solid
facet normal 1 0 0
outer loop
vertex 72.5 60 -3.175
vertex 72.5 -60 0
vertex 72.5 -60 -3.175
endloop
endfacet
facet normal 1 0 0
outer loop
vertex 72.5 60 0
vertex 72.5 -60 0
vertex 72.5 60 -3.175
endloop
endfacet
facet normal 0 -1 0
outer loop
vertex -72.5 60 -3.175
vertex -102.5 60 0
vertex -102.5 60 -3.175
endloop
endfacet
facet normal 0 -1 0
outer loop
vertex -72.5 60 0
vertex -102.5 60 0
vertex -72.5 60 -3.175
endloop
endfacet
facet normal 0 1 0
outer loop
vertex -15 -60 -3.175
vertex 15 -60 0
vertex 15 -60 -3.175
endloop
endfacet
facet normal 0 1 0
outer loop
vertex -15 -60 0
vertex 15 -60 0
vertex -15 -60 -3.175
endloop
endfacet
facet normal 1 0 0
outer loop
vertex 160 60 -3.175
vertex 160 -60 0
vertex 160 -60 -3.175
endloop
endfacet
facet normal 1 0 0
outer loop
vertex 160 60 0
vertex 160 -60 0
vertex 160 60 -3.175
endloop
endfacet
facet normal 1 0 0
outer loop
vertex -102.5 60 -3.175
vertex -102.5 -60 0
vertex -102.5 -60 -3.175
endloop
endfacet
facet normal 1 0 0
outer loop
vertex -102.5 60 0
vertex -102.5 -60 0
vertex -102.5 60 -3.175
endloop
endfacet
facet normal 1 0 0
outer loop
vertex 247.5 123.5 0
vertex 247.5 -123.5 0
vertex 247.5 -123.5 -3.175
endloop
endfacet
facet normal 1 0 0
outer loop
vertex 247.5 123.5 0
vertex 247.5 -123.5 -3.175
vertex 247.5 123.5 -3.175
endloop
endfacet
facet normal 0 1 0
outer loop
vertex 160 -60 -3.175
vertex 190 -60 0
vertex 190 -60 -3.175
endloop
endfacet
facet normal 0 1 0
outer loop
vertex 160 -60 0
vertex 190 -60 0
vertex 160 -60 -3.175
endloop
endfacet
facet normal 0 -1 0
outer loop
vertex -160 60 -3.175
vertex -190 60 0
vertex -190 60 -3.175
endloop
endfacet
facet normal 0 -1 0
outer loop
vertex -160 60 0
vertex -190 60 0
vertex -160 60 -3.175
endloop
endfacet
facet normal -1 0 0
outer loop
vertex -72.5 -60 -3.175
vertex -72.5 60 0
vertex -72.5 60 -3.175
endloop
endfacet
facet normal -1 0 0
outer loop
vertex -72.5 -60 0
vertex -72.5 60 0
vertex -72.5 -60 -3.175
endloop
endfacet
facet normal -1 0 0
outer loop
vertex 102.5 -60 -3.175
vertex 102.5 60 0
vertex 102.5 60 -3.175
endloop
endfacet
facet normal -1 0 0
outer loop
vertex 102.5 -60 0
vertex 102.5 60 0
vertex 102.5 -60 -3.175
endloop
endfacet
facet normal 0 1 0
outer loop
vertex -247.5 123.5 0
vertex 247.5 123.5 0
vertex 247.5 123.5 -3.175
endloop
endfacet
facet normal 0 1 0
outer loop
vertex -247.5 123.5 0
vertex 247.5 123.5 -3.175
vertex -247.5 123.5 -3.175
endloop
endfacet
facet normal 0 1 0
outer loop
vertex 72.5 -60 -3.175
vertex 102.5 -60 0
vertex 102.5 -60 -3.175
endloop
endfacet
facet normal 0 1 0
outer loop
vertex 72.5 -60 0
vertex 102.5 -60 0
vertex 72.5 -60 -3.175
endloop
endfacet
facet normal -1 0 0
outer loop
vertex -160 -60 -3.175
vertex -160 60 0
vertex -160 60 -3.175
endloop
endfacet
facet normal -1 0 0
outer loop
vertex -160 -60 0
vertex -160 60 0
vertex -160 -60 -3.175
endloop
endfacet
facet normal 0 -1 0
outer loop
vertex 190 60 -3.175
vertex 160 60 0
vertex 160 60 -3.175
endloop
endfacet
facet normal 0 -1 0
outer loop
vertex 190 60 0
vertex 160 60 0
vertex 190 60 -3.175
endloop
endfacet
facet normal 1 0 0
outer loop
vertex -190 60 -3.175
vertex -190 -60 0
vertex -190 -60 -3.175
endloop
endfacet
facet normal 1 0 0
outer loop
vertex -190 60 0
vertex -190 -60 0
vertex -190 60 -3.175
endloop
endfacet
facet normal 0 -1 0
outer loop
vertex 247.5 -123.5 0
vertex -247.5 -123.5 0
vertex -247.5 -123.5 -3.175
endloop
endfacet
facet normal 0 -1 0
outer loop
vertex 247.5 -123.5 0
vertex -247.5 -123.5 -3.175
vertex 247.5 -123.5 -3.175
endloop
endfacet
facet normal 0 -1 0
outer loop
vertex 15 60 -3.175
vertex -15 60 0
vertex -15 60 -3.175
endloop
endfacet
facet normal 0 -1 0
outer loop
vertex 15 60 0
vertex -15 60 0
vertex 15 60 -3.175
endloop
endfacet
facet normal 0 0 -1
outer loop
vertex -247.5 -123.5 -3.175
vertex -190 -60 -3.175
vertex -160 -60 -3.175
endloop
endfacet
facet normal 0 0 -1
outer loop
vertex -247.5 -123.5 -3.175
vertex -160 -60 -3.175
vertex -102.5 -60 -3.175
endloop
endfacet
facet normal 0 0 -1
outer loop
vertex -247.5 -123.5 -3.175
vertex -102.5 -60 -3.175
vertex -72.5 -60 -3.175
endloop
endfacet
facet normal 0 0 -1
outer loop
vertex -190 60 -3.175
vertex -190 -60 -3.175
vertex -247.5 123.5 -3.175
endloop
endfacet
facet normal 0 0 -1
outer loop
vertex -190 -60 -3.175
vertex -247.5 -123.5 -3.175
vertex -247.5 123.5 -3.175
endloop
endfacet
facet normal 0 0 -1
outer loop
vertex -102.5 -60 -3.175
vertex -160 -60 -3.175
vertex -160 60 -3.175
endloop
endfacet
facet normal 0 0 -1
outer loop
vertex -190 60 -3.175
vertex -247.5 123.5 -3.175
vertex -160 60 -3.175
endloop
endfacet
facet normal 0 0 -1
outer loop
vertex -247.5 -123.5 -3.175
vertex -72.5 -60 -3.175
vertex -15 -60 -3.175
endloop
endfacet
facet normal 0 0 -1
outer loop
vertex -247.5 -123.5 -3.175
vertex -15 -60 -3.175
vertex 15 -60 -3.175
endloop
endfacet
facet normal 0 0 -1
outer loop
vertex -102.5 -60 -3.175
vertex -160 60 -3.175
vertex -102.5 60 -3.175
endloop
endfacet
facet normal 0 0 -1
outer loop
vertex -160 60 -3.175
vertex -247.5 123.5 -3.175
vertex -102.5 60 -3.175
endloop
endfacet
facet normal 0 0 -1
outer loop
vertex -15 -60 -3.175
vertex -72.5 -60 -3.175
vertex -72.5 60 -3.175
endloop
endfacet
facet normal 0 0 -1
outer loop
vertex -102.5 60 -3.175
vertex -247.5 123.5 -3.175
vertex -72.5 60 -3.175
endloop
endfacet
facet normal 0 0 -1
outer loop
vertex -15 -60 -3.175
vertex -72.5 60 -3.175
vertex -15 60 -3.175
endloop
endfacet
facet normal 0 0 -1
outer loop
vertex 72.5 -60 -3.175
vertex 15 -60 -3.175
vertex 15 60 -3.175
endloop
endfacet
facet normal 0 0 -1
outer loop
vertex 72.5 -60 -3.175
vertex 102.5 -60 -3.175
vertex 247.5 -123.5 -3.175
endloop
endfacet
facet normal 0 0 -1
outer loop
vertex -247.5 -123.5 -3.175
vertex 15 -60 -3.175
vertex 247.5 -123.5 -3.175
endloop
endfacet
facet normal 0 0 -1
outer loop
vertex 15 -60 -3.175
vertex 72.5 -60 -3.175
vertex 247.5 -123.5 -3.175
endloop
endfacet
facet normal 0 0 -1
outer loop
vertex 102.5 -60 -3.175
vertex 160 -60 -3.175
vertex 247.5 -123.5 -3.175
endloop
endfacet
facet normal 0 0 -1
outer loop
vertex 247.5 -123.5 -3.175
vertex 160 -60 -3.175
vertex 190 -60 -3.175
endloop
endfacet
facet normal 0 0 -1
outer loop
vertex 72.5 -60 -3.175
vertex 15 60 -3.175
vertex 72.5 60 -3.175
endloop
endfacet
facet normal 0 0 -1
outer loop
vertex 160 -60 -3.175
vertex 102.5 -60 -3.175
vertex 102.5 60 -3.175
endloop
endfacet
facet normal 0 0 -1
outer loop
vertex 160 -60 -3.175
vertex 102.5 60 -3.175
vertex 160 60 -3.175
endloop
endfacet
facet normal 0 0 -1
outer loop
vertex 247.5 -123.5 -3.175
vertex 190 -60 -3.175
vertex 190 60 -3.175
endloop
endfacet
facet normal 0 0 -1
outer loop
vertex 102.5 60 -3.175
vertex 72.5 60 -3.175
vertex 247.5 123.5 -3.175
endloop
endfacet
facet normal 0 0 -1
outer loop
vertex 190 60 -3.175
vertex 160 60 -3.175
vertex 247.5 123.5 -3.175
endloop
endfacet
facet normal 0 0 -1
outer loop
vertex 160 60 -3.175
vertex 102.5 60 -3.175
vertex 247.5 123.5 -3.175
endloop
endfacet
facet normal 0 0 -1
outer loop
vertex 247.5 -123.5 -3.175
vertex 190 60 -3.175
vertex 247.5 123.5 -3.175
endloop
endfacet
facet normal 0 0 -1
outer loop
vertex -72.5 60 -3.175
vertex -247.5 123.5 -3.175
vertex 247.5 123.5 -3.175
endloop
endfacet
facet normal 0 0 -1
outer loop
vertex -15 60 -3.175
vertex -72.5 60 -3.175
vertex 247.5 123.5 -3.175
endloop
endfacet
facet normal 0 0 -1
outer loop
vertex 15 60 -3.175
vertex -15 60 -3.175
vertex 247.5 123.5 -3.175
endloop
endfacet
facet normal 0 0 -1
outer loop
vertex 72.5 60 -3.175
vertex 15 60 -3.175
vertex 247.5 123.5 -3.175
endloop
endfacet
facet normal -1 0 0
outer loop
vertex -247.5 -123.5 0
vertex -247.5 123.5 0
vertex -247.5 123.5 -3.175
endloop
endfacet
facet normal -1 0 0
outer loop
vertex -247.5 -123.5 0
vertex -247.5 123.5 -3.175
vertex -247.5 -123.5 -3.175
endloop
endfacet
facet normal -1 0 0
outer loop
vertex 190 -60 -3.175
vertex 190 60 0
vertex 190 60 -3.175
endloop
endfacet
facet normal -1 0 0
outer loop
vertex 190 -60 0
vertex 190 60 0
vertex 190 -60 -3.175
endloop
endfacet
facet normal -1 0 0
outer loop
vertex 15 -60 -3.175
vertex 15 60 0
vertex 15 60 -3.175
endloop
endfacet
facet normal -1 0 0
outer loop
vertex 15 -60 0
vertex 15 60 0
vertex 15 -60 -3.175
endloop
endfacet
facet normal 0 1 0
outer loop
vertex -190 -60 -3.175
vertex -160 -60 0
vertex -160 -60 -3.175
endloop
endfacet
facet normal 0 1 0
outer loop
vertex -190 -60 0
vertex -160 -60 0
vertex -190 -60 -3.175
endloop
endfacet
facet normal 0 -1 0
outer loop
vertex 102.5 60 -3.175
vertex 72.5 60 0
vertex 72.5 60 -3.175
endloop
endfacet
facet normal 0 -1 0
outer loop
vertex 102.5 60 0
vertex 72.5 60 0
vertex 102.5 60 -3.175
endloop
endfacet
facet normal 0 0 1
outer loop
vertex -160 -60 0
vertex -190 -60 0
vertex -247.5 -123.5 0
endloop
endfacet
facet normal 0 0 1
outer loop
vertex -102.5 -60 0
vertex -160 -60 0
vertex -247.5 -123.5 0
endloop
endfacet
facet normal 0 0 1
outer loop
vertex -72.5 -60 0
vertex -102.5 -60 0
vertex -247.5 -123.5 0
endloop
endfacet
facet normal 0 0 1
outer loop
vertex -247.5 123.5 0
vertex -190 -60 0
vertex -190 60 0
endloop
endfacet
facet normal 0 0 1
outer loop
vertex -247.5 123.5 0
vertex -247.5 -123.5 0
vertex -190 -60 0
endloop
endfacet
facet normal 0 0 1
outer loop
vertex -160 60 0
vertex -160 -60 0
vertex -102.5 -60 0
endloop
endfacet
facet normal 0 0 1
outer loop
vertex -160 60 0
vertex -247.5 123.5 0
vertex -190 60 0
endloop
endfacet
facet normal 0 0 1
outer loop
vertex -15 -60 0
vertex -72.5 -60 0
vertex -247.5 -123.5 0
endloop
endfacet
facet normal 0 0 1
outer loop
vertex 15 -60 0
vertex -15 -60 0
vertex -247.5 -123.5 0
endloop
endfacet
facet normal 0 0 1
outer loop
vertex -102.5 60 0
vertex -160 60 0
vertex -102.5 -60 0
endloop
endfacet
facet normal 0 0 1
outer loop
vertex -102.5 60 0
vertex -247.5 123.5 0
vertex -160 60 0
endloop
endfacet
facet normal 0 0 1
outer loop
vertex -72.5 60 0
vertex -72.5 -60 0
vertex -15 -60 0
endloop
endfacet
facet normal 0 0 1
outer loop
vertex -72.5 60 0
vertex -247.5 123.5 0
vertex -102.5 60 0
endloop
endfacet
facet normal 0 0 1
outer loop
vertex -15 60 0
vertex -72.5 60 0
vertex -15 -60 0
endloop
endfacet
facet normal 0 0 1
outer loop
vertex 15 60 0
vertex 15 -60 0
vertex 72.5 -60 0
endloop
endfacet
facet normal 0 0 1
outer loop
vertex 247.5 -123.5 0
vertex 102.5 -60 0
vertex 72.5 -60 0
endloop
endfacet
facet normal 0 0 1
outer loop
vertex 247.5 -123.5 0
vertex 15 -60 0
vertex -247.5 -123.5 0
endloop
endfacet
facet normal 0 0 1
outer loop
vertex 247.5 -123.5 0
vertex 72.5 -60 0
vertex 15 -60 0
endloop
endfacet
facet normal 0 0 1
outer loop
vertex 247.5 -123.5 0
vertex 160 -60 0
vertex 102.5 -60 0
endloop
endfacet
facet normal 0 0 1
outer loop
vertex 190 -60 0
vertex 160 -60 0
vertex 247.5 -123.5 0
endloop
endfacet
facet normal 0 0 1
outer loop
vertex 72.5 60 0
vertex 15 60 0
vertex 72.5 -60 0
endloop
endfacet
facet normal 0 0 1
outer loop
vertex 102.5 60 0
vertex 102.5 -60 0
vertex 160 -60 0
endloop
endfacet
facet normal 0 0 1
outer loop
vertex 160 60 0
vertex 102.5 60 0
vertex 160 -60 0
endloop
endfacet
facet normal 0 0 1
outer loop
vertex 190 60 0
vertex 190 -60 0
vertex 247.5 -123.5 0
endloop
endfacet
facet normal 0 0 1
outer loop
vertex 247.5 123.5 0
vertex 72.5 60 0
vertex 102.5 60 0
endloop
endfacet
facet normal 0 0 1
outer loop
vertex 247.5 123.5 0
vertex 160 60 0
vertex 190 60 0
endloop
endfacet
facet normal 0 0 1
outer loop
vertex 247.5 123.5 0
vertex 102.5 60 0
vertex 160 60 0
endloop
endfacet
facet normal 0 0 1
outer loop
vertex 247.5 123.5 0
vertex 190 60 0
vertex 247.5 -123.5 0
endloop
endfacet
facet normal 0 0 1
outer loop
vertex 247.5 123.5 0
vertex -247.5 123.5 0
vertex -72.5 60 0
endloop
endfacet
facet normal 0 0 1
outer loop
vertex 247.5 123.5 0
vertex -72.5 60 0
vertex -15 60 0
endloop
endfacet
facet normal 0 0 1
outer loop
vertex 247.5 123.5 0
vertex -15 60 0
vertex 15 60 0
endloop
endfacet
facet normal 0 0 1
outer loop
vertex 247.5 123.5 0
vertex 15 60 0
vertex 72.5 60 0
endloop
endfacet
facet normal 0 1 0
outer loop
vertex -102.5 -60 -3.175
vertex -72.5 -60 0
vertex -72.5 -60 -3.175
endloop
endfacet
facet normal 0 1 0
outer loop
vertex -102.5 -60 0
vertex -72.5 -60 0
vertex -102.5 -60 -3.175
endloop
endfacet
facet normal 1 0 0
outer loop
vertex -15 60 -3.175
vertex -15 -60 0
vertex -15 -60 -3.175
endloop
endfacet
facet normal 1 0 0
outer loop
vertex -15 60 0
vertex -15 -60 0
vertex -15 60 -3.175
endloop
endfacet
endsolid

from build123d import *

# Parameters (mm, degrees)
F1_DEPTH = 3.175


# Not quite as in the source:
# - a length typed as a fraction of an inch, garbled in the dataset ("3 / 203.2 mm" for 3/8 in), is restored


with BuildPart() as f1:
    # F0 (on Top) → F1 (new body)
    with BuildSketch(Plane.XY):
        Polygon((247.5, 123.5), (-247.5, 123.5), (-247.5, 0), (-190, 0), (-190, 60), (-160, 60), (-160, 0), (-102.5, 0), (-102.5, 60), (-72.5, 60), (-72.5, 0), (-15, 0), (-15, 60), (15, 60), (15, 0), (72.5, 0), (72.5, 60), (102.5, 60), (102.5, 0), (160, 0), (160, 60), (190, 60), (190, 0), (247.5, 0), align=None)
        Polygon((-190, 0), (-247.5, 0), (-247.5, -123.5), (247.5, -123.5), (247.5, 0), (190, 0), (190, -60), (160, -60), (160, 0), (102.5, 0), (102.5, -60), (72.5, -60), (72.5, 0), (15, 0), (15, -60), (-15, -60), (-15, 0), (-72.5, 0), (-72.5, -60), (-102.5, -60), (-102.5, 0), (-160, 0), (-160, -60), (-190, -60), align=None)
    extrude(amount=-F1_DEPTH)


solid = f1.part
